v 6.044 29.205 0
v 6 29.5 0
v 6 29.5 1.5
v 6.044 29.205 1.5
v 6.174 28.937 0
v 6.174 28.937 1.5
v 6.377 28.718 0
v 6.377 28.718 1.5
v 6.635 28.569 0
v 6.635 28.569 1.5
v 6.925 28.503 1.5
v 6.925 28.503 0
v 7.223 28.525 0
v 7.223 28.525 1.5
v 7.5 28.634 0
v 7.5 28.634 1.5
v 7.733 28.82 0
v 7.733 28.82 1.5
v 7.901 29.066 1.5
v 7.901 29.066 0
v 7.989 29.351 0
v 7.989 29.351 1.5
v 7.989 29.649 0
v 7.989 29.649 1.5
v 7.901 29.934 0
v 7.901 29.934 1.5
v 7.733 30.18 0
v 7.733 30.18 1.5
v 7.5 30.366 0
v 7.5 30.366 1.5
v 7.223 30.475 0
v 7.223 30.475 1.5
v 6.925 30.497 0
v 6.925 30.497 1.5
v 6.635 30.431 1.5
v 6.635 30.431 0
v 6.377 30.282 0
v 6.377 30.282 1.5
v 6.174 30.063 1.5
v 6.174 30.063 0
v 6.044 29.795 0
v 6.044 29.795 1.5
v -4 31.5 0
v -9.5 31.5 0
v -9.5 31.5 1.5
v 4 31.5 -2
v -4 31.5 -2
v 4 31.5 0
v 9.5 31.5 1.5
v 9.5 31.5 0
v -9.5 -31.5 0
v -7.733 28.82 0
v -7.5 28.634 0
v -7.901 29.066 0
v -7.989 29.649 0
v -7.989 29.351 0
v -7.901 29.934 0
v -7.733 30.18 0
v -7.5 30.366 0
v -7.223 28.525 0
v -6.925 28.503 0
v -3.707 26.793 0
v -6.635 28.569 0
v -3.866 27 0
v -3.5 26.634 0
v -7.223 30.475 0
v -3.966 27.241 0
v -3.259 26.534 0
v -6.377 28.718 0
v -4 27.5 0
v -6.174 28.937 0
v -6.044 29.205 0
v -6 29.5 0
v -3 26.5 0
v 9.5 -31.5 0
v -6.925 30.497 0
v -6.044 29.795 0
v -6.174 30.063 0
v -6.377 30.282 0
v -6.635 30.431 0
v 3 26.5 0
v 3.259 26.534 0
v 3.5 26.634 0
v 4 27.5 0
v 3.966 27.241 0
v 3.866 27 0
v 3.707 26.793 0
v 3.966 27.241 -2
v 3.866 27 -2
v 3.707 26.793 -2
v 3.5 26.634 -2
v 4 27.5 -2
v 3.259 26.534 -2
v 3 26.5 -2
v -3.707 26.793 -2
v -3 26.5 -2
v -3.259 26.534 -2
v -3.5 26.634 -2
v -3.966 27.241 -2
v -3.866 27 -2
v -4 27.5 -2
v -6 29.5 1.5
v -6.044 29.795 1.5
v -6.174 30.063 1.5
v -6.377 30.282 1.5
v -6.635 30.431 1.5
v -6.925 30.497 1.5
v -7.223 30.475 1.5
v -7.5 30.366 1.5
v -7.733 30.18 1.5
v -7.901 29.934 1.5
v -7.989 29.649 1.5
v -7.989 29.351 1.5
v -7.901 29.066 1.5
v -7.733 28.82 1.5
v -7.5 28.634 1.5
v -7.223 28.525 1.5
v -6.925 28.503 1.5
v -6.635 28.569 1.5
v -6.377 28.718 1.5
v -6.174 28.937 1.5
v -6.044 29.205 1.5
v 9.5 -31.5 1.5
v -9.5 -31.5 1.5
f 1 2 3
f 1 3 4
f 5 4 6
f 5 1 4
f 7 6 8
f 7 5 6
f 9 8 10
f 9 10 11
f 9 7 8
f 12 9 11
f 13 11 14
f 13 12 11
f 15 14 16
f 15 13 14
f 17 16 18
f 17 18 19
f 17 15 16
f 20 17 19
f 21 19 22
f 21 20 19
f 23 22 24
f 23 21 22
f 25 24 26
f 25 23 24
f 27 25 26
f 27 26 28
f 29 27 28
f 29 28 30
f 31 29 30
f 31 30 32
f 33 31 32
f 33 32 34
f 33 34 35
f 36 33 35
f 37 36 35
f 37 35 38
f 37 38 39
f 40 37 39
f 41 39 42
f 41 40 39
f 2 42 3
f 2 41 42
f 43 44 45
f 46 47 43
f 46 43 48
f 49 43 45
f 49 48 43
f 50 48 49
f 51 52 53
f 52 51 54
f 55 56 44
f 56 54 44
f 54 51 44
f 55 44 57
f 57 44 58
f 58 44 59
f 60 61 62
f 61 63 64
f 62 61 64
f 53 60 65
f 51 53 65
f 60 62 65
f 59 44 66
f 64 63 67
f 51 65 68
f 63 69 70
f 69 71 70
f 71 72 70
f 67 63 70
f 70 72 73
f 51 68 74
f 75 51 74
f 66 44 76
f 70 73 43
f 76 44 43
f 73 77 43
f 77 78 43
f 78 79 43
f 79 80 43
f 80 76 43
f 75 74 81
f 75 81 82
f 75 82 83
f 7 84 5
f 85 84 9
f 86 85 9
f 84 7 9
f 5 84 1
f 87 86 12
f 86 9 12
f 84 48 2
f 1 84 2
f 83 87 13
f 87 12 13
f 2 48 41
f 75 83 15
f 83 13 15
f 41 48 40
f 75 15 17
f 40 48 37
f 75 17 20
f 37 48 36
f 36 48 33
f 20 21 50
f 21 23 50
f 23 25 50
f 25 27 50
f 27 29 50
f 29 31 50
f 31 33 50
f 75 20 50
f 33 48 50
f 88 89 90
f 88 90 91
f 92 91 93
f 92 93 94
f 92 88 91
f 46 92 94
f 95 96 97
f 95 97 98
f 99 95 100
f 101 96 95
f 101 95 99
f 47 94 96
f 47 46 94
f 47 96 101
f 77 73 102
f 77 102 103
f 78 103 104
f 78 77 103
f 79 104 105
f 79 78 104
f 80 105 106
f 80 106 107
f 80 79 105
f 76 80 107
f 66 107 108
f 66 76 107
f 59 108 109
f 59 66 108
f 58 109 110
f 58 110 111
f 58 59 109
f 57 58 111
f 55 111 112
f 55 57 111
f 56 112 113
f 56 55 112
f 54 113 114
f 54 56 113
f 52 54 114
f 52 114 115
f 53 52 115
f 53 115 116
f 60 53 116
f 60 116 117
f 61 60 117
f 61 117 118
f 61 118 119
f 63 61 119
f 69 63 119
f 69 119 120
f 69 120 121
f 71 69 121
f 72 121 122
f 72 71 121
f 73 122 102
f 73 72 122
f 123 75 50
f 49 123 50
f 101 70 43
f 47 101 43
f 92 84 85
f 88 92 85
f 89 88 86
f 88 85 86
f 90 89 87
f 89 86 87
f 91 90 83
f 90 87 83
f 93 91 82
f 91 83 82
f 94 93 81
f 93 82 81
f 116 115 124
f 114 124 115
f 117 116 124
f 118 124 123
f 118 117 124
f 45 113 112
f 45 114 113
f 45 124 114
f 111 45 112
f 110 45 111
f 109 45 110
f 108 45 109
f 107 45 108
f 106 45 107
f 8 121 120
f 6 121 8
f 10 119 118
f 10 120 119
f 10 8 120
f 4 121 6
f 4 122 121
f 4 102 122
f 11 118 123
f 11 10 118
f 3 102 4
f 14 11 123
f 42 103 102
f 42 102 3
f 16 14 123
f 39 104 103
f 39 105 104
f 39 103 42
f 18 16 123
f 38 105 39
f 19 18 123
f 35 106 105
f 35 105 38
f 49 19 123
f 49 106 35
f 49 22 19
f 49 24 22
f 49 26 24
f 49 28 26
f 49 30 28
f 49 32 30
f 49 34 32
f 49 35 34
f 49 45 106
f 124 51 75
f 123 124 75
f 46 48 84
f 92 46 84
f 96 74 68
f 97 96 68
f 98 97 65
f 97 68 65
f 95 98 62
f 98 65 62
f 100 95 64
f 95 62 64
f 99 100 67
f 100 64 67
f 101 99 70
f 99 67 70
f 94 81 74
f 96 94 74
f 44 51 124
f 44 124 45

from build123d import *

# Parameters (mm, degrees)
ESQUISSE1_W        = 19
ESQUISSE1_H        = 63
ESQUISSE1_R        = 1
BOSS_EXTRU_1_DEPTH = 1.5
BOSS_EXTRU_2_DEPTH = 2


with BuildPart() as part:
    # Esquisse1 → Boss.-Extru.1 (new body)
    with BuildSketch(Plane.XY):
        Rectangle(ESQUISSE1_W, ESQUISSE1_H)
        with Locations((-7, 29.5)):
            Circle(ESQUISSE1_R, mode=Mode.SUBTRACT)
        with Locations(Location((7, 29.5, 0), (0, 0, 180))):
            Circle(ESQUISSE1_R, mode=Mode.SUBTRACT)
    extrude(amount=BOSS_EXTRU_1_DEPTH)

    # Esquisse2 → Boss.-Extru.2 (add)
    with BuildSketch(Plane(origin=(0, 0, 0), x_dir=(-1, 0, 0), z_dir=(0, 0, -1))):
        with BuildLine():
            Line((-4, 31.5), (-4, 27.5))
            ThreePointArc((-4, 27.5), (-3.707106781, 26.792893219), (-3, 26.5))
            Line((-3, 26.5), (3, 26.5))
            ThreePointArc((3, 26.5), (3.707106781, 26.792893219), (4, 27.5))
            Line((4, 27.5), (4, 31.5))
            Line((4, 31.5), (-4, 31.5))
        make_face()
    extrude(amount=BOSS_EXTRU_2_DEPTH)


solid = part.part
